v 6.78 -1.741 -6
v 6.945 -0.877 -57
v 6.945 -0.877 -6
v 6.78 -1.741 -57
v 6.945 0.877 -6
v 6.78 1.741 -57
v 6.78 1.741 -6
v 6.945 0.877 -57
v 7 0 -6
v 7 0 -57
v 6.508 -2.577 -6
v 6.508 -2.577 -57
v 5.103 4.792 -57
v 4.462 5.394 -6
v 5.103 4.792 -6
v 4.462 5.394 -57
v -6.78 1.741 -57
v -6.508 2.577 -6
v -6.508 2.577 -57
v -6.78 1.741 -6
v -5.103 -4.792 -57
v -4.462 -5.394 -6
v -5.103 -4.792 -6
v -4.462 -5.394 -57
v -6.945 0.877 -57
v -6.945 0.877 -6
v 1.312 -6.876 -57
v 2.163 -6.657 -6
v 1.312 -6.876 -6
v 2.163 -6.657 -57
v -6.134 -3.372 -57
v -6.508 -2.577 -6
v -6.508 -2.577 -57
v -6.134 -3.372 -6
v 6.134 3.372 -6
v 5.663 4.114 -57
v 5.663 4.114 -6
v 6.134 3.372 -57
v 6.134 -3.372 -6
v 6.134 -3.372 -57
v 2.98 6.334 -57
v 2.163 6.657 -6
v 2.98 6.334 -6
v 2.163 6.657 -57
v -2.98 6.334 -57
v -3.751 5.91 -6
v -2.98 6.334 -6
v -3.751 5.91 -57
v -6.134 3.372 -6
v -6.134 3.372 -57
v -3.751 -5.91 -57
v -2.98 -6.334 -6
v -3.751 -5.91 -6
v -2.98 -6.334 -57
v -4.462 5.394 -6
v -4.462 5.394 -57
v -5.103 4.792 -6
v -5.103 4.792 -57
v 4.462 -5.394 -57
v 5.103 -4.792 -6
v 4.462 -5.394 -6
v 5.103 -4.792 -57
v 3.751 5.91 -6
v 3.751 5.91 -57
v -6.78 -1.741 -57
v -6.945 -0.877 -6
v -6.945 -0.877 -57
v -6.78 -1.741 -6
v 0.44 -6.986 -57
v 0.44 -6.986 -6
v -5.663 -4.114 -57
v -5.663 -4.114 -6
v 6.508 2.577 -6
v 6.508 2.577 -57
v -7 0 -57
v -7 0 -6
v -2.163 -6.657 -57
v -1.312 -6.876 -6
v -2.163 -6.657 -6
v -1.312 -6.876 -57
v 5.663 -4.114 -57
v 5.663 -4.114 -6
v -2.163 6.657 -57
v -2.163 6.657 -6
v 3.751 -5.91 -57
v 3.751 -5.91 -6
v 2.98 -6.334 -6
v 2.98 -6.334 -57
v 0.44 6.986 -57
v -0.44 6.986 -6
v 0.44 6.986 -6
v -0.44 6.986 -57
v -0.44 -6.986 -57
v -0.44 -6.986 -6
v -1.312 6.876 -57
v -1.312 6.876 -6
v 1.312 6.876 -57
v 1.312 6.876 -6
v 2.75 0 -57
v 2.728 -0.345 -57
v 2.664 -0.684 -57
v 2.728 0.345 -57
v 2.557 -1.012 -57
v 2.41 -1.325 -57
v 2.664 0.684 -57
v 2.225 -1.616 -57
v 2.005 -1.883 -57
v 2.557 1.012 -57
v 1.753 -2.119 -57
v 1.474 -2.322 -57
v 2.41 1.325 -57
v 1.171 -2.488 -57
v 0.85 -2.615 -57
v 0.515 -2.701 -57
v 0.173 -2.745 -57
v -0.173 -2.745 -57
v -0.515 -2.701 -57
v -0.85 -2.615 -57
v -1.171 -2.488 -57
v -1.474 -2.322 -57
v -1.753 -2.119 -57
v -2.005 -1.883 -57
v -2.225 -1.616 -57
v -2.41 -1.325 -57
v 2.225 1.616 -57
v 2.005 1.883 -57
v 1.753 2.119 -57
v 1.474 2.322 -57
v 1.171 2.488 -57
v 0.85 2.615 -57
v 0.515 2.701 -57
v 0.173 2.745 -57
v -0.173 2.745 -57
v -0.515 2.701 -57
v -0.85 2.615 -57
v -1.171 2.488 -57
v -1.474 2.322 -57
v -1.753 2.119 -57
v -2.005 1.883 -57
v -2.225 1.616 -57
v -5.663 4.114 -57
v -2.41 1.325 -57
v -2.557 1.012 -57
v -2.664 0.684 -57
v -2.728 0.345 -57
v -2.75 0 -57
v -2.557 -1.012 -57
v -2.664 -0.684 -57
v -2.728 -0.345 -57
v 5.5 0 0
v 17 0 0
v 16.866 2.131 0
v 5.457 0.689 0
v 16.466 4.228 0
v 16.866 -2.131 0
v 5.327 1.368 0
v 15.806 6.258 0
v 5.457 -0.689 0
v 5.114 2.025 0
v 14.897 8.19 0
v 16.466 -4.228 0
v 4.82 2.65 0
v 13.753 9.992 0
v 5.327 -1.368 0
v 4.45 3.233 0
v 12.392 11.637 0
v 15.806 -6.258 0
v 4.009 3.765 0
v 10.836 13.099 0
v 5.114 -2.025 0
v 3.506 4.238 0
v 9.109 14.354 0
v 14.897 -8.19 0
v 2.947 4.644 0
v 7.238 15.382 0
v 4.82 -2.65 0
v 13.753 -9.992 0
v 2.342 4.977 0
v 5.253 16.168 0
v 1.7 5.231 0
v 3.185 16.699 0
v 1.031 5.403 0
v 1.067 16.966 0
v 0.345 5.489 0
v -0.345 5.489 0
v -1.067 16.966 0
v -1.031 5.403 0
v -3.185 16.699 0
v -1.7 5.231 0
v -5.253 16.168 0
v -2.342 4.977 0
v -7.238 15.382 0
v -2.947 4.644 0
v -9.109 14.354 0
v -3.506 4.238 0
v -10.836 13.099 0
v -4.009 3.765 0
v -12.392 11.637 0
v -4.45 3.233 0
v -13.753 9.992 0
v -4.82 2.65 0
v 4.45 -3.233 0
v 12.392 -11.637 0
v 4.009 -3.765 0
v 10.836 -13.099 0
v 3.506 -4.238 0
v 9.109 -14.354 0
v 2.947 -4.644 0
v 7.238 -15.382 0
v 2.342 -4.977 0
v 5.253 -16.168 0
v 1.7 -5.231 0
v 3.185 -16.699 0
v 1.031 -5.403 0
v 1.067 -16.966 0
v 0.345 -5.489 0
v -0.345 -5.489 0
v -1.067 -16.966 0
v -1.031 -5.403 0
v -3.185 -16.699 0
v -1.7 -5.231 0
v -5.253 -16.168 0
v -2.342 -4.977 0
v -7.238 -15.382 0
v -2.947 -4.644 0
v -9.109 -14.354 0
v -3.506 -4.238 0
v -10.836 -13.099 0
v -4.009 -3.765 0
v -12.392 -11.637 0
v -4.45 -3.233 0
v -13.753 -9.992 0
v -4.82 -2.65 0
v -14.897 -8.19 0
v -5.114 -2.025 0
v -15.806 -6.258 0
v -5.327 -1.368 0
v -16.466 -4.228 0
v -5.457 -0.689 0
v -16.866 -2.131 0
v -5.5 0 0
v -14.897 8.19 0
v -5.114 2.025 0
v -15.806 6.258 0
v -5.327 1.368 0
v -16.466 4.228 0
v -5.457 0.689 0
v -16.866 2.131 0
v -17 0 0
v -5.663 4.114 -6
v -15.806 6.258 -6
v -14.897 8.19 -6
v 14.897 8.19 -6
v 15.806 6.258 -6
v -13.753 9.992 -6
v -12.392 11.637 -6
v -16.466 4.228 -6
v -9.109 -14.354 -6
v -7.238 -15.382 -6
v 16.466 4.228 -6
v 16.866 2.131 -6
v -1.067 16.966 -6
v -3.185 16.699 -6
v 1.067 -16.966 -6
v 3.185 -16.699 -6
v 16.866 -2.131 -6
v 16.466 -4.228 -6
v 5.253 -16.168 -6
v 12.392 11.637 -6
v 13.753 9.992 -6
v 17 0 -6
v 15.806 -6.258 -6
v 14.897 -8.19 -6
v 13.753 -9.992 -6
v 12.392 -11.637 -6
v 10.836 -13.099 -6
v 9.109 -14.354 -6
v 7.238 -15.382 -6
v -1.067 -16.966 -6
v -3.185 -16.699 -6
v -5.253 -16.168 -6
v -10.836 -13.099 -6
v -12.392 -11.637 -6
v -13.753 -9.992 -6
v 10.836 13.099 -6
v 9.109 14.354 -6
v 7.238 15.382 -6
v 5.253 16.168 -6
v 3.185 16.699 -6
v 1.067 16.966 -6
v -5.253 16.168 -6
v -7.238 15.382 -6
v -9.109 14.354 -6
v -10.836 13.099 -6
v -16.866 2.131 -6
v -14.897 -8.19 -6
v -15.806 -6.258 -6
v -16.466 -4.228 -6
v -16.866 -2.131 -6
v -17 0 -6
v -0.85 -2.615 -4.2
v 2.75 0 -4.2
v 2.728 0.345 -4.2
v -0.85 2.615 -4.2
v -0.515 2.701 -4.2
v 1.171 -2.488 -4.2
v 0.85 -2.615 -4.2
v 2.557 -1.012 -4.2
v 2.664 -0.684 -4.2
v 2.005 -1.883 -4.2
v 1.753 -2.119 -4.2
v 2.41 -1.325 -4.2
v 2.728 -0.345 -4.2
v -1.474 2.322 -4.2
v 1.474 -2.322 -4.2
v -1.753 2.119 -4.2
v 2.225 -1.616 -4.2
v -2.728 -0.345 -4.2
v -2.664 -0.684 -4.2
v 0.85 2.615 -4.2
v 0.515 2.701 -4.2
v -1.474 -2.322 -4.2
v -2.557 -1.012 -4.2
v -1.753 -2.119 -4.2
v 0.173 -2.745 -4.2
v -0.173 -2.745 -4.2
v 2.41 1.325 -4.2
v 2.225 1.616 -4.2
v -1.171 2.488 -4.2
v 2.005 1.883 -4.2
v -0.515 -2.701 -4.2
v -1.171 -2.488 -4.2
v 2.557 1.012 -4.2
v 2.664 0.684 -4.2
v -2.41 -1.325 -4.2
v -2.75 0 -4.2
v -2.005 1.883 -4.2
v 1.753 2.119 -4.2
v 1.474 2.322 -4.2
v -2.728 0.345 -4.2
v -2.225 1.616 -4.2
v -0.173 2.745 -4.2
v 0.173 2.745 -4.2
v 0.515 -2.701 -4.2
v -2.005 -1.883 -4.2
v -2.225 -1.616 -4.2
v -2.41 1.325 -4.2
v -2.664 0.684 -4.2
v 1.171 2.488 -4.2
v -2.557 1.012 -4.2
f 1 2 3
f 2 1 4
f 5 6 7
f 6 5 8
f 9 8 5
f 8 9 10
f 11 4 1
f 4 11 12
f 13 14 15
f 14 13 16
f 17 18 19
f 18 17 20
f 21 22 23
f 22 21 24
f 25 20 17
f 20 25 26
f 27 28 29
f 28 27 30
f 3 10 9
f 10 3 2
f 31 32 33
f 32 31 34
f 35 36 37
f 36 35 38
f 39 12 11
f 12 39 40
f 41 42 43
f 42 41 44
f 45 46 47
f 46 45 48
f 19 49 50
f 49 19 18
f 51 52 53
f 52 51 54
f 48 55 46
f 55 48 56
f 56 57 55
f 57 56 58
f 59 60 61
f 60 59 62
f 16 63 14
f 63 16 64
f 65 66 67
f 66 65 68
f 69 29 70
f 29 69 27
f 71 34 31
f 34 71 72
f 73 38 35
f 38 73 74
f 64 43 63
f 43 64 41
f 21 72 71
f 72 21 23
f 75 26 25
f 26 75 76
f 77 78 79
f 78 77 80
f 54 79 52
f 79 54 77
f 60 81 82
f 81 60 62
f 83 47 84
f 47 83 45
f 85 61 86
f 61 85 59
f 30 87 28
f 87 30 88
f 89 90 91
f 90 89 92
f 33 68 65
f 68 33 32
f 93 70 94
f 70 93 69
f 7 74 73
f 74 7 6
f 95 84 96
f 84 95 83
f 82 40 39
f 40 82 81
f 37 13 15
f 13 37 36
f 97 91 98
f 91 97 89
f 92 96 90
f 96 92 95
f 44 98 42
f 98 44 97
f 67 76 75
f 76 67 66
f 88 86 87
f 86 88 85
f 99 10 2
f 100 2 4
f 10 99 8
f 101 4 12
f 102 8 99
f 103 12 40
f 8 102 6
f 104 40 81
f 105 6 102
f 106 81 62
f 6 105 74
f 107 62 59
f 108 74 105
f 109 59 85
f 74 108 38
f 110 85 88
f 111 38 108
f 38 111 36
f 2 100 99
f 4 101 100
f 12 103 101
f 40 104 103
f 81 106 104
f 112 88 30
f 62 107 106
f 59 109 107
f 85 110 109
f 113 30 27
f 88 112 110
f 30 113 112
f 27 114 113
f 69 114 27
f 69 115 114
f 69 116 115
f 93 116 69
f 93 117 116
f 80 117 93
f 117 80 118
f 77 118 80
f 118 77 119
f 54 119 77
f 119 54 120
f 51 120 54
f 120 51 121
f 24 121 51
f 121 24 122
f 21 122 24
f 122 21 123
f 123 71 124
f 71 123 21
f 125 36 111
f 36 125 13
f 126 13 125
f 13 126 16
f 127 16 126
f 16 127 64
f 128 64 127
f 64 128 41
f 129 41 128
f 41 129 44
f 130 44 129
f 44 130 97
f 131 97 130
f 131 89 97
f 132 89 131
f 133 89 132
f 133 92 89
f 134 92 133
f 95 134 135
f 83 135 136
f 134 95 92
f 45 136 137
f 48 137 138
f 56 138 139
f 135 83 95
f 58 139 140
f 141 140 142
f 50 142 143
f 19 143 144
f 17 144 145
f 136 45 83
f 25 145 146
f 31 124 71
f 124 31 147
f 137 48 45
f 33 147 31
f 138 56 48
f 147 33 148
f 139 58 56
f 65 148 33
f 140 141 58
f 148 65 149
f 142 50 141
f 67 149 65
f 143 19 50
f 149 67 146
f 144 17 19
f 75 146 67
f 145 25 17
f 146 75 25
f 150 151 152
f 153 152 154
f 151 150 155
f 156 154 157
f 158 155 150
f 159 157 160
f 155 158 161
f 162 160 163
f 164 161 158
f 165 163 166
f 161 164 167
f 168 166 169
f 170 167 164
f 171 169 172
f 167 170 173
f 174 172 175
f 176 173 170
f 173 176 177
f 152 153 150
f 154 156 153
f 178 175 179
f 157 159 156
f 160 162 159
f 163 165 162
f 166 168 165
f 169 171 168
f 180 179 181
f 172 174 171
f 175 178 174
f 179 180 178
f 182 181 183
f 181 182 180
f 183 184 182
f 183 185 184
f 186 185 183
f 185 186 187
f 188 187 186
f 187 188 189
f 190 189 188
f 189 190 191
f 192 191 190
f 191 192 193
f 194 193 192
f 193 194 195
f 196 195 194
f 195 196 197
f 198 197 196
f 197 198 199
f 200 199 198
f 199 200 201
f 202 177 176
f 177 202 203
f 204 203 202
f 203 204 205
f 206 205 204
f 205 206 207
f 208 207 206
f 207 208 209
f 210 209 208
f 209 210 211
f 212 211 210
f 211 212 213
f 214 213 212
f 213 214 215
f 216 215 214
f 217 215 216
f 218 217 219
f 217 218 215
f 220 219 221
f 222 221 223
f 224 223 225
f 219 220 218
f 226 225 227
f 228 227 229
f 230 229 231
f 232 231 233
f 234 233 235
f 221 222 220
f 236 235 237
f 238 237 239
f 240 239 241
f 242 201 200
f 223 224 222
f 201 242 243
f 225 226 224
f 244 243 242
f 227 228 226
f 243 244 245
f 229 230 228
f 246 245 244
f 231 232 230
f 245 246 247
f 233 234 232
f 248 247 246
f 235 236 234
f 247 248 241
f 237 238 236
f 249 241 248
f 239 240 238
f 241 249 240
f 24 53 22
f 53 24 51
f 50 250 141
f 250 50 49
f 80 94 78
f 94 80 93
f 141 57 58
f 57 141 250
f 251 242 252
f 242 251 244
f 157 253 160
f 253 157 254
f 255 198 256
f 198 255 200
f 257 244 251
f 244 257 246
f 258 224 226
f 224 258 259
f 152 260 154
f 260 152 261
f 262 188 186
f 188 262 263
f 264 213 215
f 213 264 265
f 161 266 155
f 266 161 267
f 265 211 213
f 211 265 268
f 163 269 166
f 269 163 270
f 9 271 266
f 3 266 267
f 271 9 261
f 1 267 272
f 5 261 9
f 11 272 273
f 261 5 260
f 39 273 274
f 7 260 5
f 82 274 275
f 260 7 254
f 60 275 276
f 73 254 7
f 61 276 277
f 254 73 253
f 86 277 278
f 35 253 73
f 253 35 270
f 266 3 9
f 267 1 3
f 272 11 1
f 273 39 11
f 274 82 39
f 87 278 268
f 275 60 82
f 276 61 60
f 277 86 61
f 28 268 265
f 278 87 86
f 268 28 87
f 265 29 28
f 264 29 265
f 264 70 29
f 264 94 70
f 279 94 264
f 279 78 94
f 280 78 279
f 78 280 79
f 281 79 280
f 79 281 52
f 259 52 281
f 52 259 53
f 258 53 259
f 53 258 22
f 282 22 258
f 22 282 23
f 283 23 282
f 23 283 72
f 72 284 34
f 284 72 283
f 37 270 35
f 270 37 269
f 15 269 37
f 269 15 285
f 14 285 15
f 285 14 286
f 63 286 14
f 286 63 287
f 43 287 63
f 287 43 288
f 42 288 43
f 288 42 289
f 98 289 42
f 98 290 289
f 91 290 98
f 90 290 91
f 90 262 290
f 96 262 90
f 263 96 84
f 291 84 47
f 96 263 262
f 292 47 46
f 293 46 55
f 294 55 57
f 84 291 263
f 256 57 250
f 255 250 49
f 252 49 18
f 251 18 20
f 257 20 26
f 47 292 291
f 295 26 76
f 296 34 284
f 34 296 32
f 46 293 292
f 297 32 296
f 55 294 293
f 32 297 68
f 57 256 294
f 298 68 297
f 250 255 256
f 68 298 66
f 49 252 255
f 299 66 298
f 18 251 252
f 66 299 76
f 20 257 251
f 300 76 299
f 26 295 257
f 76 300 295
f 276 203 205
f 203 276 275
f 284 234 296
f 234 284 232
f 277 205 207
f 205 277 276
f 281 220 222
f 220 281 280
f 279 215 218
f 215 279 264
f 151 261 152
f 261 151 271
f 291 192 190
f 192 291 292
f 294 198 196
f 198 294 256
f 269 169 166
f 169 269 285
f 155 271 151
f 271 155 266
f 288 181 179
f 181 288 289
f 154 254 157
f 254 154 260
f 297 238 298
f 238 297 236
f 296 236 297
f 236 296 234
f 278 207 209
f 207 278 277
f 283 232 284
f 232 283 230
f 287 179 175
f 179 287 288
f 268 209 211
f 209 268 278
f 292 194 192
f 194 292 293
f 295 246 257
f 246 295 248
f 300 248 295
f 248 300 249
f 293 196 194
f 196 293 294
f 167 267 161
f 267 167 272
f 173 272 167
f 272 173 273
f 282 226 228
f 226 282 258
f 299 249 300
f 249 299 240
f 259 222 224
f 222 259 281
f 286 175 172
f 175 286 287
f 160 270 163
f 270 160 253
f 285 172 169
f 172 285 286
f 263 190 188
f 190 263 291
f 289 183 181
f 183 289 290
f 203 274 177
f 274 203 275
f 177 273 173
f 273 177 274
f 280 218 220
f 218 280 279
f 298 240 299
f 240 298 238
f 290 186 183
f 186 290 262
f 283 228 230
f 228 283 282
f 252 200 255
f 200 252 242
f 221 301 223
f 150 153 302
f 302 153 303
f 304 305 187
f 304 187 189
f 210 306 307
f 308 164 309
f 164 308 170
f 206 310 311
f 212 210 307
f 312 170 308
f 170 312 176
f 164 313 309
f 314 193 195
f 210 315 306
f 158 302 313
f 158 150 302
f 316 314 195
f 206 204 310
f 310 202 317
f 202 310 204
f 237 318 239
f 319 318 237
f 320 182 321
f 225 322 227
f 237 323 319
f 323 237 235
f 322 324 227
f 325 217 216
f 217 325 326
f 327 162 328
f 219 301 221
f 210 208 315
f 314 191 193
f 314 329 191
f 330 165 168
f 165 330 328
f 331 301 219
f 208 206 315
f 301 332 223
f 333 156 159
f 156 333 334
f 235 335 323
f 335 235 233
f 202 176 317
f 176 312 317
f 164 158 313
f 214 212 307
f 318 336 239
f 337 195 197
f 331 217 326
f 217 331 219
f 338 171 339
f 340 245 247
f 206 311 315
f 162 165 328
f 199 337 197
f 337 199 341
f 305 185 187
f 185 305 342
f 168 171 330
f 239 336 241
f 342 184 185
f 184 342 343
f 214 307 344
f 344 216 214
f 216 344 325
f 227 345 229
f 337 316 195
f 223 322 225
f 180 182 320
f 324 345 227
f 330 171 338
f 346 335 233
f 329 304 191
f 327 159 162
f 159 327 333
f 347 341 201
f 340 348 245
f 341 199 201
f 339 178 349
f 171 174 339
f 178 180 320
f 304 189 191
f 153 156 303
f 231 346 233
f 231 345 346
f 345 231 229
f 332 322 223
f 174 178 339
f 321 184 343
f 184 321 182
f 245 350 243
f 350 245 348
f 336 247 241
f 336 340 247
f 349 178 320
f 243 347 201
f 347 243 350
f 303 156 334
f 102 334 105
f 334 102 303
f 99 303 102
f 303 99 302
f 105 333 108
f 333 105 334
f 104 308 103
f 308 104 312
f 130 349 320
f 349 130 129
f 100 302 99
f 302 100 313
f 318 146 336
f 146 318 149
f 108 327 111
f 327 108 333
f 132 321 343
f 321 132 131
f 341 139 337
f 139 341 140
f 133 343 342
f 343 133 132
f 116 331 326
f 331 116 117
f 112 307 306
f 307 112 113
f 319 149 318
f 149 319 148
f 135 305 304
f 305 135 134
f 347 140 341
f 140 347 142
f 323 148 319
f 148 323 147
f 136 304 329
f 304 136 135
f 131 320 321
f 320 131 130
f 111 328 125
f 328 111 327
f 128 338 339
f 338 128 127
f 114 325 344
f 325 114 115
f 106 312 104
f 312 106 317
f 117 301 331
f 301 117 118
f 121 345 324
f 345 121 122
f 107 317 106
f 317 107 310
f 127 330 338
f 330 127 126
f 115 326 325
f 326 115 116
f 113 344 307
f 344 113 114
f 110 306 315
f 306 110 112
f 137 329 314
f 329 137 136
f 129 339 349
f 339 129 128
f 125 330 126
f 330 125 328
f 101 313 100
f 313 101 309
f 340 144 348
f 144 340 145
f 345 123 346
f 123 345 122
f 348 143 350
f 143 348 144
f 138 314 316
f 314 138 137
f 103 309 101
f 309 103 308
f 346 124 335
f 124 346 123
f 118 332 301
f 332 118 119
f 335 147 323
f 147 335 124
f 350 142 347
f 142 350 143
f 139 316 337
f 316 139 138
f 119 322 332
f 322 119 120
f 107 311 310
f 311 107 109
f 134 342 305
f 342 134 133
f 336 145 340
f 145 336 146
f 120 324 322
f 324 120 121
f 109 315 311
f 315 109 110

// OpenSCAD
$fn = 50;


difference() {
	union() {
		translate(v = [0, 0, -57.0000000000]) {
			cylinder(h = 57, r = 7.0000000000);
		}
		translate(v = [0, 0, -6.0000000000]) {
			cylinder(h = 6, r = 17.0000000000);
		}
	}
	union() {
		translate(v = [0, 0, 0]) {
			rotate(a = [0, 0, 0]) {
				difference() {
					union() {
						#translate(v = [0, 0, -57.0000000000]) {
							cylinder(h = 57, r = 2.2500000000);
						}
						#translate(v = [0, 0, -4.2000000000]) {
							cylinder(h = 4.2000000000, r1 = 2.7500000000, r2 = 5.5000000000);
						}
						#translate(v = [0, 0, -57.0000000000]) {
							cylinder(h = 57, r = 2.7500000000);
						}
						#translate(v = [0, 0, -57.0000000000]) {
							cylinder(h = 57, r = 2.2500000000);
						}
					}
					union();
				}
			}
		}
	}
}
